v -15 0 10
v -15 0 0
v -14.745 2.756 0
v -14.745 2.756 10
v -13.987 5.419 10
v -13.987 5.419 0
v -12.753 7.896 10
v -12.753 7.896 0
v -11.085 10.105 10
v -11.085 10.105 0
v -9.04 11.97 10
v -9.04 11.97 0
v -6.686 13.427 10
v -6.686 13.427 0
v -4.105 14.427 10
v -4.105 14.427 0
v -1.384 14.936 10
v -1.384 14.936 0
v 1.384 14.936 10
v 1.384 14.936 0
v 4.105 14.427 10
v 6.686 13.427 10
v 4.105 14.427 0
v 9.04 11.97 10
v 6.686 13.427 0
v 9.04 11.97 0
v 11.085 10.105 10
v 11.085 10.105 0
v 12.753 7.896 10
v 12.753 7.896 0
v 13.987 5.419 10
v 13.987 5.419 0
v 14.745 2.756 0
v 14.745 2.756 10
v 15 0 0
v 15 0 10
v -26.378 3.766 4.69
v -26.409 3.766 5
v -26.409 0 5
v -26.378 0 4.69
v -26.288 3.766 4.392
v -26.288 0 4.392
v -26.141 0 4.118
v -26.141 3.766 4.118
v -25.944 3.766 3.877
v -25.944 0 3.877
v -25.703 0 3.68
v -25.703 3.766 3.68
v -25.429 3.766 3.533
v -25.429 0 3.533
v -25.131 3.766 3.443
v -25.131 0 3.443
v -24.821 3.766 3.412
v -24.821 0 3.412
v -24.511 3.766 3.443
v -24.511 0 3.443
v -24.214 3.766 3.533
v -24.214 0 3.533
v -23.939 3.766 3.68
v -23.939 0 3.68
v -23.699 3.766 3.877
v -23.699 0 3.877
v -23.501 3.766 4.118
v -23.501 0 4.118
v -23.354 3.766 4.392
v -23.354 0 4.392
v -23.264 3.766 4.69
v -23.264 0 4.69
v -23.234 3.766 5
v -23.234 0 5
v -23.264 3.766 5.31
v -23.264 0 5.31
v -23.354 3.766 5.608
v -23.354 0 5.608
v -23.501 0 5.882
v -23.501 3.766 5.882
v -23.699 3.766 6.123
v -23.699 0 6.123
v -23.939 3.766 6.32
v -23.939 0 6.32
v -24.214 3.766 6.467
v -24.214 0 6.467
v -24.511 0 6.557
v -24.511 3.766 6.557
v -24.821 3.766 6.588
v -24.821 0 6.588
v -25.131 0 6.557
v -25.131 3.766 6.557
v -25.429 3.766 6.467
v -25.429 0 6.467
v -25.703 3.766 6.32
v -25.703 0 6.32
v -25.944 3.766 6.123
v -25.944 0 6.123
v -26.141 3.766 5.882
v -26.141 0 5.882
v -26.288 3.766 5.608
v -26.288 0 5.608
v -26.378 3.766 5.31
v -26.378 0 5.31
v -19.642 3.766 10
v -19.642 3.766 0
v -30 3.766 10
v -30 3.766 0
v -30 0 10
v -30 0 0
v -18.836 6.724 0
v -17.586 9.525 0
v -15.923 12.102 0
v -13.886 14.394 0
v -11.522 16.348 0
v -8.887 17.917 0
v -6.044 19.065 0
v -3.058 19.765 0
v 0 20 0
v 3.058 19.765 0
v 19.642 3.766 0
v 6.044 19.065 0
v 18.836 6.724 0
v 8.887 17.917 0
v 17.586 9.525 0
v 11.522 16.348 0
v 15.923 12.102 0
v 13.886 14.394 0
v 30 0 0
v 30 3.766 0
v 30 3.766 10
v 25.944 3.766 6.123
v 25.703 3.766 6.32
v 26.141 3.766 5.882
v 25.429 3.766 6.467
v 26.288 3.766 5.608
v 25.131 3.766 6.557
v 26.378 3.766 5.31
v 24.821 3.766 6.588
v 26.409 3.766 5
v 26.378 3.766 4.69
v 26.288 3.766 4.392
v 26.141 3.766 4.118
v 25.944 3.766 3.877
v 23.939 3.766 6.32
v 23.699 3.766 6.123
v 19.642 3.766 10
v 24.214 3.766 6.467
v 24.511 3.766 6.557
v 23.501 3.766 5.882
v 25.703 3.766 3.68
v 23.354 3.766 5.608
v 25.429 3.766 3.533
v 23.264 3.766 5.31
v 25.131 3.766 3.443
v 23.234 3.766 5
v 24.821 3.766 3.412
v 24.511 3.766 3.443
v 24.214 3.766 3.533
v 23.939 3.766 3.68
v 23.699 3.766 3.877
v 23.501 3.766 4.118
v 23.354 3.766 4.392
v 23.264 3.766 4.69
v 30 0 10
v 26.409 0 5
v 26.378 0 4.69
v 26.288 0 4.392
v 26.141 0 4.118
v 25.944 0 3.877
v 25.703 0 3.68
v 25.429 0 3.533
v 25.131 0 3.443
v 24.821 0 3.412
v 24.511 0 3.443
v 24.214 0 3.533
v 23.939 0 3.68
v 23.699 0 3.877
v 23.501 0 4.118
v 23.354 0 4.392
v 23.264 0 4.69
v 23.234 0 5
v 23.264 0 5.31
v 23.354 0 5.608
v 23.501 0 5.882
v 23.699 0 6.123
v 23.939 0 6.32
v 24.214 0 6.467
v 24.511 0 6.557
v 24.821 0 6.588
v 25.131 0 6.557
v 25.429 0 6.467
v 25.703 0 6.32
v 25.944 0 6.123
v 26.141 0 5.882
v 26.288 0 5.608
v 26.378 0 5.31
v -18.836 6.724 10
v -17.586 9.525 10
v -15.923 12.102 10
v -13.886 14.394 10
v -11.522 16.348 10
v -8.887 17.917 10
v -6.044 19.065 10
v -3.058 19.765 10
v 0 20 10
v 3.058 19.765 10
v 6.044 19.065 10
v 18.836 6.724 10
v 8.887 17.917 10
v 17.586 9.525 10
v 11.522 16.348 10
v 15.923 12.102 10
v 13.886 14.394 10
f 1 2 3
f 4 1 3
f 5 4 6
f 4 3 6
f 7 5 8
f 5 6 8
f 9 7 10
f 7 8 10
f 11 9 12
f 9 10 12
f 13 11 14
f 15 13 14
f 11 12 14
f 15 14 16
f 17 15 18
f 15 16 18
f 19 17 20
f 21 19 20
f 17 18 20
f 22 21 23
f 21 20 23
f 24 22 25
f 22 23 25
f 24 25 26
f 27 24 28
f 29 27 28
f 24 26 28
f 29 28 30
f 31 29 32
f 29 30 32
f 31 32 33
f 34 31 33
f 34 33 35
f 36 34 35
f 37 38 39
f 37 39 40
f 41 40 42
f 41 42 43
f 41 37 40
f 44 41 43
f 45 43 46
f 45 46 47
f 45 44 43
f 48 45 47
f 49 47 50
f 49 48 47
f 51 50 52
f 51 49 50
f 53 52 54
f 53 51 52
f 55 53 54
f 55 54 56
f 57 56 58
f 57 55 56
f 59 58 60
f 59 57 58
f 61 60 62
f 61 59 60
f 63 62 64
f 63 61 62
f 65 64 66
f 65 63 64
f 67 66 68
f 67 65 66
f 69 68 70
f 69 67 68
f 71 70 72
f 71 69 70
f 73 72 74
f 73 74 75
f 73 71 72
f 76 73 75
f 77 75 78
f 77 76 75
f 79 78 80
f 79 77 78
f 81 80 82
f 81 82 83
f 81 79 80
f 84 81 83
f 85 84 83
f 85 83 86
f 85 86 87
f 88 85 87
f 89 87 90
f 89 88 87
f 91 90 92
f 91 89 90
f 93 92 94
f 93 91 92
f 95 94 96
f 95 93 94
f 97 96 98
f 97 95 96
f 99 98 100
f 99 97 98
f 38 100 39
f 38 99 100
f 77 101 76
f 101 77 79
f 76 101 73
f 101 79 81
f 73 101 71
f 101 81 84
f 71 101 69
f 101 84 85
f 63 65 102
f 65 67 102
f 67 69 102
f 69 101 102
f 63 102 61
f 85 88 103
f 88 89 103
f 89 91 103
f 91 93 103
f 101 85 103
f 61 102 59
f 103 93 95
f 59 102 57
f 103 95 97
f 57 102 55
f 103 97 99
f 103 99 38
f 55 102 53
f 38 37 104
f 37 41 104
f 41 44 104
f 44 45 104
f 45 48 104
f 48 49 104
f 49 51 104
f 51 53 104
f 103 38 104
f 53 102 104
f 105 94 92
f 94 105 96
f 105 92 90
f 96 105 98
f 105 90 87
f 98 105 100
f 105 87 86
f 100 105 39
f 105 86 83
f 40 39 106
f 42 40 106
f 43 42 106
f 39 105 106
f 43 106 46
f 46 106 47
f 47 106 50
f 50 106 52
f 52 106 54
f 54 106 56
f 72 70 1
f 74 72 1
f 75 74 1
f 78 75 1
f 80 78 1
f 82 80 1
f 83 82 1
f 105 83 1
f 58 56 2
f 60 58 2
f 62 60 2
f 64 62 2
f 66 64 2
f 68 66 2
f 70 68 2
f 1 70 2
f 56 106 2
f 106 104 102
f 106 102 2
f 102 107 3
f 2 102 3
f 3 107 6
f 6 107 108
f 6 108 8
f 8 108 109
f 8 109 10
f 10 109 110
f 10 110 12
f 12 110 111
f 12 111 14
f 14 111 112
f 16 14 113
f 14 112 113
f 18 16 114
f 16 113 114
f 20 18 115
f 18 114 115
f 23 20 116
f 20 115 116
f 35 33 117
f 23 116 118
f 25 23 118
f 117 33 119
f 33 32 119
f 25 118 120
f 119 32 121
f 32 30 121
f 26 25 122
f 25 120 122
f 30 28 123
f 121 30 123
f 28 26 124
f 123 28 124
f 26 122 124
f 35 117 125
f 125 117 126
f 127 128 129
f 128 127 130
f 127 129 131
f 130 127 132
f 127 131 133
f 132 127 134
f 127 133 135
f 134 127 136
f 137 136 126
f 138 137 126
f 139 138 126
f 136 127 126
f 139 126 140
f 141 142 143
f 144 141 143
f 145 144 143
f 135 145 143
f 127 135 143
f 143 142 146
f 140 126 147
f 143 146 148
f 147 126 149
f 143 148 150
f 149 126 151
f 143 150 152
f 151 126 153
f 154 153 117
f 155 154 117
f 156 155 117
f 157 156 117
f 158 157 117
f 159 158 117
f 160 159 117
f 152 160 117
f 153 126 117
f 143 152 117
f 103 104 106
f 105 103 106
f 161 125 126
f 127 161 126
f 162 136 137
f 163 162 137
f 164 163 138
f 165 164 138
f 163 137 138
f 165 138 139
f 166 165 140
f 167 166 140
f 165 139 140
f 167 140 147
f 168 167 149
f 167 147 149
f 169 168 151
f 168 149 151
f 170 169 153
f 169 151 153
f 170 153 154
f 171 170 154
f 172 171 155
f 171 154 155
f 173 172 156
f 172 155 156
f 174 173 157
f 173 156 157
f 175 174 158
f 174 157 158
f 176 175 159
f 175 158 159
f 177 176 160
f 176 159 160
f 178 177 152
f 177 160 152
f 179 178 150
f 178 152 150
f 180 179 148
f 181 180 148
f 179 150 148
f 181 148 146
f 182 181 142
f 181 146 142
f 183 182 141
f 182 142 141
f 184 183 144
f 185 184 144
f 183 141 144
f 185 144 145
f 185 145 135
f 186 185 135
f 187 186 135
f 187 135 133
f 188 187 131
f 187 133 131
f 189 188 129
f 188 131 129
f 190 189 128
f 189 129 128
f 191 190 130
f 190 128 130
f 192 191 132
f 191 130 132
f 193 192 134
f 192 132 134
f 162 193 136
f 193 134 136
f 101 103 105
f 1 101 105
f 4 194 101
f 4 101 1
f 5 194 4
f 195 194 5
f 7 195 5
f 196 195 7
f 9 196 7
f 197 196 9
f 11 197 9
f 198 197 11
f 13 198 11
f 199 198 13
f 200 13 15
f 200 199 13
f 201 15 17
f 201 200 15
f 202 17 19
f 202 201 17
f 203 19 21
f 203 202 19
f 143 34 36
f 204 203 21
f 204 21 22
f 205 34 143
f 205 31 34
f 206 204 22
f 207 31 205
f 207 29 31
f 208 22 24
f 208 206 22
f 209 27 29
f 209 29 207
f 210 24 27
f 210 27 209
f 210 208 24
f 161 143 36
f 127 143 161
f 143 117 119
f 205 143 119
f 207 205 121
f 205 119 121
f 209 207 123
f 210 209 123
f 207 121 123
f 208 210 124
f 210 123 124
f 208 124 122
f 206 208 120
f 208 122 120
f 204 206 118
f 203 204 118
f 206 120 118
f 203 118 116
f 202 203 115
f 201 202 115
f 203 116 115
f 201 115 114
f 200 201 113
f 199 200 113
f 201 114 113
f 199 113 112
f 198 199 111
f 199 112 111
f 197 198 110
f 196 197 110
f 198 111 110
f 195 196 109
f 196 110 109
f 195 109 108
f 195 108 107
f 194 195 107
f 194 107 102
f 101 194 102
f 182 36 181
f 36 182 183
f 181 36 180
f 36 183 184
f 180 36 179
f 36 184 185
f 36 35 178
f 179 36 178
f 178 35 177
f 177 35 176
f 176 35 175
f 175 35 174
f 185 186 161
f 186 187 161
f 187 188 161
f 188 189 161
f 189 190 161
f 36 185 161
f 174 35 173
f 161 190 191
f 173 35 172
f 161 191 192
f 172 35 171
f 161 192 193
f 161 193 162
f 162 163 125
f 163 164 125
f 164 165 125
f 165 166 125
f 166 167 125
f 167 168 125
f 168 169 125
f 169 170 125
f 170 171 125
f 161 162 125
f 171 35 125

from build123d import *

# Parameters (mm, degrees)
BOSS_EXTRUDE1_DEPTH = 10
SKETCH2_R           = 1.5875
CUT_EXTRUDE1_DEPTH  = 3.765696


with BuildPart() as part:
    # Sketch1 → Boss-Extrude1 (new body)
    with BuildSketch(Plane.XY):
        with BuildLine():
            Line((-20, 0), (-15, 0))
            ThreePointArc((-15, 0), (0, 15), (15, 0))
            Line((15, 0), (20, 0))
            Line((20, 0), (30, 0))
            Line((30, 0), (30, 3.765695973))
            Line((30, 3.765695973), (19.642289425, 3.765695973))
            ThreePointArc((19.642289425, 3.765695973), (0, 20), (-19.642289425, 3.765695973))
            Line((-19.642289425, 3.765695973), (-30, 3.765695973))
            Line((-30, 3.765695973), (-30, 0))
            Line((-30, 0), (-20, 0))
        make_face()
    extrude(amount=BOSS_EXTRUDE1_DEPTH)

    # Sketch2 → Cut-Extrude1 (cut)
    with BuildSketch(Plane(origin=(0, 3.765695973, 0), x_dir=(1, 0, 0), z_dir=(0, 1, 0))):
        with Locations((24.821144712, -5)):
            Circle(SKETCH2_R)
    cut_extrude1 = extrude(amount=-CUT_EXTRUDE1_DEPTH, mode=Mode.SUBTRACT)

    # Mirror1: Cut-Extrude1 across plane
    add(cut_extrude1.mirror(Plane.ZY), mode=Mode.SUBTRACT)


solid = part.part
